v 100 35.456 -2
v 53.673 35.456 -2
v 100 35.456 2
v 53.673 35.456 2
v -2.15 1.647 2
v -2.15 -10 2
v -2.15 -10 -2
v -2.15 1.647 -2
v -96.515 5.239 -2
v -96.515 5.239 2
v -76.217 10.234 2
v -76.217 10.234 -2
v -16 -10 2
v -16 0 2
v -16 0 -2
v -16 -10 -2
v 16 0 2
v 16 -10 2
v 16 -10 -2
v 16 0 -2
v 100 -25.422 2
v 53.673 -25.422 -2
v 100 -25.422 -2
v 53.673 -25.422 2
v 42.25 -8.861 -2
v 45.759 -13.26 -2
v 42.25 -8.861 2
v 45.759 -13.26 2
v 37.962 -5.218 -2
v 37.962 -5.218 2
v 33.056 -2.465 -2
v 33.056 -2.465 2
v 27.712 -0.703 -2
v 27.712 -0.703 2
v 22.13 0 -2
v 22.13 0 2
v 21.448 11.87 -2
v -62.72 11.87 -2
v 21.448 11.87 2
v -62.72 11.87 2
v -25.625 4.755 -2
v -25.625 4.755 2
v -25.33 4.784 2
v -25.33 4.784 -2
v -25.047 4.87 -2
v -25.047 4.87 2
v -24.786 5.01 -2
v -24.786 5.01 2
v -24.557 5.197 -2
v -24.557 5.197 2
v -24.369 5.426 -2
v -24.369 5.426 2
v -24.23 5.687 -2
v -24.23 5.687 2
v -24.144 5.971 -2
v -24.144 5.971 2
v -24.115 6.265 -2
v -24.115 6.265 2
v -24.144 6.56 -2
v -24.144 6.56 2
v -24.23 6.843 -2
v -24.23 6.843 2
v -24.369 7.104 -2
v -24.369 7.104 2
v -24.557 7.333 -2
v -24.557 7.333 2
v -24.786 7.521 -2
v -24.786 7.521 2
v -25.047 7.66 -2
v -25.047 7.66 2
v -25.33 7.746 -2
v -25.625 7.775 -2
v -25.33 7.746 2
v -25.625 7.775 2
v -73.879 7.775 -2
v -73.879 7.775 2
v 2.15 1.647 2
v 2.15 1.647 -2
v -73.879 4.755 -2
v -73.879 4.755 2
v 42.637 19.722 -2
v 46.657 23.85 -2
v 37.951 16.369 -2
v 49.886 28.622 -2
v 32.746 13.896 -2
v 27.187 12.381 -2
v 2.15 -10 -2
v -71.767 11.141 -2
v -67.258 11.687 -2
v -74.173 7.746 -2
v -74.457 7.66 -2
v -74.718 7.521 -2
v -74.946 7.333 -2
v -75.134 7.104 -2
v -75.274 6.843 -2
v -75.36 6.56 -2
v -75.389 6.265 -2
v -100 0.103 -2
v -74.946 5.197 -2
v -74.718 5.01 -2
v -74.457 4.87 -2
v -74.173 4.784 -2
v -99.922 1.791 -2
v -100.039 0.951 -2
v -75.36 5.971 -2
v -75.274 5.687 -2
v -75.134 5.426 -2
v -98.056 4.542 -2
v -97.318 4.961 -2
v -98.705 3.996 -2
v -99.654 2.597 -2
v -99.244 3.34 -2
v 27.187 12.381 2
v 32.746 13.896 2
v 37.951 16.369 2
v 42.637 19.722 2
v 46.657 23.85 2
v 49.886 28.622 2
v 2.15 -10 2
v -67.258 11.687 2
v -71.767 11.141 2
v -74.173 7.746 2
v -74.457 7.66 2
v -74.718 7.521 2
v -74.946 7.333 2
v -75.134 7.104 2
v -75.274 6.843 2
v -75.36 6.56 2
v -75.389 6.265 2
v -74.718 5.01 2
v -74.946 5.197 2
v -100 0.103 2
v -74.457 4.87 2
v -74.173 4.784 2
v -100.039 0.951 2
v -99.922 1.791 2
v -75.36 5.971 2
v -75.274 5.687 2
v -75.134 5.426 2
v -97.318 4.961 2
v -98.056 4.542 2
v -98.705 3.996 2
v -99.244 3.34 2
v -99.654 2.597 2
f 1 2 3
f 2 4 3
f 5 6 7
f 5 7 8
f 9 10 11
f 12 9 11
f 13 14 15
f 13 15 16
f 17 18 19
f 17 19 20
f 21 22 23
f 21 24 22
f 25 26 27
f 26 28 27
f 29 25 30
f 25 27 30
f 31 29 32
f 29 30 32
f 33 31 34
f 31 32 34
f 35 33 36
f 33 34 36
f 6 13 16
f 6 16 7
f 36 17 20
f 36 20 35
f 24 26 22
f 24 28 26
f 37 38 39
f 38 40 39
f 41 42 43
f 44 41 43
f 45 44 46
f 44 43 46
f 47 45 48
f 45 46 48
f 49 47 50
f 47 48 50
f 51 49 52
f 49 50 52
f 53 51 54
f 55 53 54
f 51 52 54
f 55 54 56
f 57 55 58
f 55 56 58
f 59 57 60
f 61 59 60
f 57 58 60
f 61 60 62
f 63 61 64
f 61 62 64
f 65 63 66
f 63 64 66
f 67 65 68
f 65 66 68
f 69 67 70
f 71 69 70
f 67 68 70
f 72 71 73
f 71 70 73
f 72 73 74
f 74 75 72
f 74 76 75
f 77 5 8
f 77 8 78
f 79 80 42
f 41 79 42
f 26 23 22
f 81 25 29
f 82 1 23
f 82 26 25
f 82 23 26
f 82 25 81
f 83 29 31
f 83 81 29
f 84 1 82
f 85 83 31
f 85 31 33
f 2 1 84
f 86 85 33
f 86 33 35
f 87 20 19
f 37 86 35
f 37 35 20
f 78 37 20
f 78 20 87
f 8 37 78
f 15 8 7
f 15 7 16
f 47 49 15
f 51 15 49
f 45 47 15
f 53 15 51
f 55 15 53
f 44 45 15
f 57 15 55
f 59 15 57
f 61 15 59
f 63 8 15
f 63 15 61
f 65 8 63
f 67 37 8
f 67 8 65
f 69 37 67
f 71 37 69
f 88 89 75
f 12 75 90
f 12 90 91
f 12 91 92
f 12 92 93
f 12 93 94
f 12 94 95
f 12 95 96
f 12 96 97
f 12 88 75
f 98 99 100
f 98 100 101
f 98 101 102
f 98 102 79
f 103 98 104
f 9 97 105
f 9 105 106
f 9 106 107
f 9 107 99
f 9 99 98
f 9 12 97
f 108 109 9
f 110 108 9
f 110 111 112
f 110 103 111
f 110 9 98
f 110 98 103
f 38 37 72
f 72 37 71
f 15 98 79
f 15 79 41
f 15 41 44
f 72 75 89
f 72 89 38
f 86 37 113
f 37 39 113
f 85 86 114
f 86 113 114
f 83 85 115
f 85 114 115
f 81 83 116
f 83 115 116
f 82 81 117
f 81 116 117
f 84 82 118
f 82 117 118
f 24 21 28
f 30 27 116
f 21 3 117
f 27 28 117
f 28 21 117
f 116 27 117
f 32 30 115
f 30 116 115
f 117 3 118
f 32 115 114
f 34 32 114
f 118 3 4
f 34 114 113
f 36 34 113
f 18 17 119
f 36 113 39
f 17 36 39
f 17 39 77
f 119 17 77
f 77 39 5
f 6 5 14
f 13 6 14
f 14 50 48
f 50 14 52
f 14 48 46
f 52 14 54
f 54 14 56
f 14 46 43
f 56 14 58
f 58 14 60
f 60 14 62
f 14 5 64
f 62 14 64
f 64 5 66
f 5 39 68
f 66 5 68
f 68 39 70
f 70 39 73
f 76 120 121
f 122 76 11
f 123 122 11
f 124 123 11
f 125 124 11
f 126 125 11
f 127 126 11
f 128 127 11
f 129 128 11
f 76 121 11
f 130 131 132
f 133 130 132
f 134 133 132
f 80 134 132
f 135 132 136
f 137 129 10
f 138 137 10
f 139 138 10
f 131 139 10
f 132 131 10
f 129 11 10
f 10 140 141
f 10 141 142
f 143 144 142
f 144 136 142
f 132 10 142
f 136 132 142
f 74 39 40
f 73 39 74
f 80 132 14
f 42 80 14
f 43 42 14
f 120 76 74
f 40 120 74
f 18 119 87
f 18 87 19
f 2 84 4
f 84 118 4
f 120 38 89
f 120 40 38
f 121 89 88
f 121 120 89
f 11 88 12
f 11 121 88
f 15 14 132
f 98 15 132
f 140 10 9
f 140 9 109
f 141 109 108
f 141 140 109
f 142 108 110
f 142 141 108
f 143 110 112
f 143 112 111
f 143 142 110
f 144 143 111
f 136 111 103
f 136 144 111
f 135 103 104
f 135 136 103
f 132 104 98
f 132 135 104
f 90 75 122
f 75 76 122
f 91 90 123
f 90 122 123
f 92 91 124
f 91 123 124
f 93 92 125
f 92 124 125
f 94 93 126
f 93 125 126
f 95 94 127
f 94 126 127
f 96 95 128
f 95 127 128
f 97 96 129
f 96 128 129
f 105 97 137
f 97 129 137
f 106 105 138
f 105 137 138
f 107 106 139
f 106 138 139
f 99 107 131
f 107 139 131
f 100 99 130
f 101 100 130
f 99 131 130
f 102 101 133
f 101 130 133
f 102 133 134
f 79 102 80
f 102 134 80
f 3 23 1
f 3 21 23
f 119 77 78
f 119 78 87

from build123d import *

# Parameters (mm, degrees)
PAD_DEPTH = 2


with BuildPart() as part:
    # CopySketch004 → Pad (new body, symmetric)
    with BuildSketch(Plane.XY):
        with BuildLine():
            Line((-96.515385, 5.238812), (-76.217438, 10.233695))
            ThreePointArc((-62.72, 11.87), (-69.518131, 11.459432), (-76.217438, 10.233695))
            Line((-62.72, 11.87), (-42.55212, 11.87))
            Line((-42.55212, 11.87), (21.447979, 11.87))
            ThreePointArc((21.447979, 11.87), (37.950708, 16.369447), (49.885903, 28.622457))
            Line((49.885903, 28.622457), (53.673439, 35.456396))
            Line((53.673439, 35.456396), (100, 35.456396))
            Line((100, 35.456396), (100, 0))
            Line((100, -25.422476), (100, 0))
            Line((53.673439, -25.422476), (100, -25.422476))
            Line((45.758618, -13.259565), (53.673439, -25.422476))
            ThreePointArc((45.758618, -13.259565), (35.575672, -3.722807), (22.130121, 0))
            Line((16, 0), (22.130121, 0))
            Line((16, -10), (16, 0))
            Line((2.15, -10), (16, -10))
            Line((2.15, 1.647389), (2.15, -10))
            Line((-2.15, 1.647389), (2.15, 1.647389))
            Line((-2.15, -10), (-2.15, 1.647389))
            Line((-16, -10), (-2.15, -10))
            Line((-16, 0), (-16, -10))
            Line((-16, 0), (-100, 0.10272))
            ThreePointArc((-96.515385, 5.238812), (-99.243994, 3.339928), (-100, 0.10272))
        make_face()
        with BuildLine():
            ThreePointArc((-73.8787, 7.775189), (-75.3887, 6.265189), (-73.8787, 4.755189))
            Line((-73.8787, 4.755189), (-25.624771, 4.755189))
            ThreePointArc((-25.624771, 4.755189), (-24.114771, 6.265189), (-25.624771, 7.775189))
            Line((-73.8787, 7.775189), (-25.624771, 7.775189))
        make_face(mode=Mode.SUBTRACT)
    extrude(amount=PAD_DEPTH, both=True)


solid = part.part
